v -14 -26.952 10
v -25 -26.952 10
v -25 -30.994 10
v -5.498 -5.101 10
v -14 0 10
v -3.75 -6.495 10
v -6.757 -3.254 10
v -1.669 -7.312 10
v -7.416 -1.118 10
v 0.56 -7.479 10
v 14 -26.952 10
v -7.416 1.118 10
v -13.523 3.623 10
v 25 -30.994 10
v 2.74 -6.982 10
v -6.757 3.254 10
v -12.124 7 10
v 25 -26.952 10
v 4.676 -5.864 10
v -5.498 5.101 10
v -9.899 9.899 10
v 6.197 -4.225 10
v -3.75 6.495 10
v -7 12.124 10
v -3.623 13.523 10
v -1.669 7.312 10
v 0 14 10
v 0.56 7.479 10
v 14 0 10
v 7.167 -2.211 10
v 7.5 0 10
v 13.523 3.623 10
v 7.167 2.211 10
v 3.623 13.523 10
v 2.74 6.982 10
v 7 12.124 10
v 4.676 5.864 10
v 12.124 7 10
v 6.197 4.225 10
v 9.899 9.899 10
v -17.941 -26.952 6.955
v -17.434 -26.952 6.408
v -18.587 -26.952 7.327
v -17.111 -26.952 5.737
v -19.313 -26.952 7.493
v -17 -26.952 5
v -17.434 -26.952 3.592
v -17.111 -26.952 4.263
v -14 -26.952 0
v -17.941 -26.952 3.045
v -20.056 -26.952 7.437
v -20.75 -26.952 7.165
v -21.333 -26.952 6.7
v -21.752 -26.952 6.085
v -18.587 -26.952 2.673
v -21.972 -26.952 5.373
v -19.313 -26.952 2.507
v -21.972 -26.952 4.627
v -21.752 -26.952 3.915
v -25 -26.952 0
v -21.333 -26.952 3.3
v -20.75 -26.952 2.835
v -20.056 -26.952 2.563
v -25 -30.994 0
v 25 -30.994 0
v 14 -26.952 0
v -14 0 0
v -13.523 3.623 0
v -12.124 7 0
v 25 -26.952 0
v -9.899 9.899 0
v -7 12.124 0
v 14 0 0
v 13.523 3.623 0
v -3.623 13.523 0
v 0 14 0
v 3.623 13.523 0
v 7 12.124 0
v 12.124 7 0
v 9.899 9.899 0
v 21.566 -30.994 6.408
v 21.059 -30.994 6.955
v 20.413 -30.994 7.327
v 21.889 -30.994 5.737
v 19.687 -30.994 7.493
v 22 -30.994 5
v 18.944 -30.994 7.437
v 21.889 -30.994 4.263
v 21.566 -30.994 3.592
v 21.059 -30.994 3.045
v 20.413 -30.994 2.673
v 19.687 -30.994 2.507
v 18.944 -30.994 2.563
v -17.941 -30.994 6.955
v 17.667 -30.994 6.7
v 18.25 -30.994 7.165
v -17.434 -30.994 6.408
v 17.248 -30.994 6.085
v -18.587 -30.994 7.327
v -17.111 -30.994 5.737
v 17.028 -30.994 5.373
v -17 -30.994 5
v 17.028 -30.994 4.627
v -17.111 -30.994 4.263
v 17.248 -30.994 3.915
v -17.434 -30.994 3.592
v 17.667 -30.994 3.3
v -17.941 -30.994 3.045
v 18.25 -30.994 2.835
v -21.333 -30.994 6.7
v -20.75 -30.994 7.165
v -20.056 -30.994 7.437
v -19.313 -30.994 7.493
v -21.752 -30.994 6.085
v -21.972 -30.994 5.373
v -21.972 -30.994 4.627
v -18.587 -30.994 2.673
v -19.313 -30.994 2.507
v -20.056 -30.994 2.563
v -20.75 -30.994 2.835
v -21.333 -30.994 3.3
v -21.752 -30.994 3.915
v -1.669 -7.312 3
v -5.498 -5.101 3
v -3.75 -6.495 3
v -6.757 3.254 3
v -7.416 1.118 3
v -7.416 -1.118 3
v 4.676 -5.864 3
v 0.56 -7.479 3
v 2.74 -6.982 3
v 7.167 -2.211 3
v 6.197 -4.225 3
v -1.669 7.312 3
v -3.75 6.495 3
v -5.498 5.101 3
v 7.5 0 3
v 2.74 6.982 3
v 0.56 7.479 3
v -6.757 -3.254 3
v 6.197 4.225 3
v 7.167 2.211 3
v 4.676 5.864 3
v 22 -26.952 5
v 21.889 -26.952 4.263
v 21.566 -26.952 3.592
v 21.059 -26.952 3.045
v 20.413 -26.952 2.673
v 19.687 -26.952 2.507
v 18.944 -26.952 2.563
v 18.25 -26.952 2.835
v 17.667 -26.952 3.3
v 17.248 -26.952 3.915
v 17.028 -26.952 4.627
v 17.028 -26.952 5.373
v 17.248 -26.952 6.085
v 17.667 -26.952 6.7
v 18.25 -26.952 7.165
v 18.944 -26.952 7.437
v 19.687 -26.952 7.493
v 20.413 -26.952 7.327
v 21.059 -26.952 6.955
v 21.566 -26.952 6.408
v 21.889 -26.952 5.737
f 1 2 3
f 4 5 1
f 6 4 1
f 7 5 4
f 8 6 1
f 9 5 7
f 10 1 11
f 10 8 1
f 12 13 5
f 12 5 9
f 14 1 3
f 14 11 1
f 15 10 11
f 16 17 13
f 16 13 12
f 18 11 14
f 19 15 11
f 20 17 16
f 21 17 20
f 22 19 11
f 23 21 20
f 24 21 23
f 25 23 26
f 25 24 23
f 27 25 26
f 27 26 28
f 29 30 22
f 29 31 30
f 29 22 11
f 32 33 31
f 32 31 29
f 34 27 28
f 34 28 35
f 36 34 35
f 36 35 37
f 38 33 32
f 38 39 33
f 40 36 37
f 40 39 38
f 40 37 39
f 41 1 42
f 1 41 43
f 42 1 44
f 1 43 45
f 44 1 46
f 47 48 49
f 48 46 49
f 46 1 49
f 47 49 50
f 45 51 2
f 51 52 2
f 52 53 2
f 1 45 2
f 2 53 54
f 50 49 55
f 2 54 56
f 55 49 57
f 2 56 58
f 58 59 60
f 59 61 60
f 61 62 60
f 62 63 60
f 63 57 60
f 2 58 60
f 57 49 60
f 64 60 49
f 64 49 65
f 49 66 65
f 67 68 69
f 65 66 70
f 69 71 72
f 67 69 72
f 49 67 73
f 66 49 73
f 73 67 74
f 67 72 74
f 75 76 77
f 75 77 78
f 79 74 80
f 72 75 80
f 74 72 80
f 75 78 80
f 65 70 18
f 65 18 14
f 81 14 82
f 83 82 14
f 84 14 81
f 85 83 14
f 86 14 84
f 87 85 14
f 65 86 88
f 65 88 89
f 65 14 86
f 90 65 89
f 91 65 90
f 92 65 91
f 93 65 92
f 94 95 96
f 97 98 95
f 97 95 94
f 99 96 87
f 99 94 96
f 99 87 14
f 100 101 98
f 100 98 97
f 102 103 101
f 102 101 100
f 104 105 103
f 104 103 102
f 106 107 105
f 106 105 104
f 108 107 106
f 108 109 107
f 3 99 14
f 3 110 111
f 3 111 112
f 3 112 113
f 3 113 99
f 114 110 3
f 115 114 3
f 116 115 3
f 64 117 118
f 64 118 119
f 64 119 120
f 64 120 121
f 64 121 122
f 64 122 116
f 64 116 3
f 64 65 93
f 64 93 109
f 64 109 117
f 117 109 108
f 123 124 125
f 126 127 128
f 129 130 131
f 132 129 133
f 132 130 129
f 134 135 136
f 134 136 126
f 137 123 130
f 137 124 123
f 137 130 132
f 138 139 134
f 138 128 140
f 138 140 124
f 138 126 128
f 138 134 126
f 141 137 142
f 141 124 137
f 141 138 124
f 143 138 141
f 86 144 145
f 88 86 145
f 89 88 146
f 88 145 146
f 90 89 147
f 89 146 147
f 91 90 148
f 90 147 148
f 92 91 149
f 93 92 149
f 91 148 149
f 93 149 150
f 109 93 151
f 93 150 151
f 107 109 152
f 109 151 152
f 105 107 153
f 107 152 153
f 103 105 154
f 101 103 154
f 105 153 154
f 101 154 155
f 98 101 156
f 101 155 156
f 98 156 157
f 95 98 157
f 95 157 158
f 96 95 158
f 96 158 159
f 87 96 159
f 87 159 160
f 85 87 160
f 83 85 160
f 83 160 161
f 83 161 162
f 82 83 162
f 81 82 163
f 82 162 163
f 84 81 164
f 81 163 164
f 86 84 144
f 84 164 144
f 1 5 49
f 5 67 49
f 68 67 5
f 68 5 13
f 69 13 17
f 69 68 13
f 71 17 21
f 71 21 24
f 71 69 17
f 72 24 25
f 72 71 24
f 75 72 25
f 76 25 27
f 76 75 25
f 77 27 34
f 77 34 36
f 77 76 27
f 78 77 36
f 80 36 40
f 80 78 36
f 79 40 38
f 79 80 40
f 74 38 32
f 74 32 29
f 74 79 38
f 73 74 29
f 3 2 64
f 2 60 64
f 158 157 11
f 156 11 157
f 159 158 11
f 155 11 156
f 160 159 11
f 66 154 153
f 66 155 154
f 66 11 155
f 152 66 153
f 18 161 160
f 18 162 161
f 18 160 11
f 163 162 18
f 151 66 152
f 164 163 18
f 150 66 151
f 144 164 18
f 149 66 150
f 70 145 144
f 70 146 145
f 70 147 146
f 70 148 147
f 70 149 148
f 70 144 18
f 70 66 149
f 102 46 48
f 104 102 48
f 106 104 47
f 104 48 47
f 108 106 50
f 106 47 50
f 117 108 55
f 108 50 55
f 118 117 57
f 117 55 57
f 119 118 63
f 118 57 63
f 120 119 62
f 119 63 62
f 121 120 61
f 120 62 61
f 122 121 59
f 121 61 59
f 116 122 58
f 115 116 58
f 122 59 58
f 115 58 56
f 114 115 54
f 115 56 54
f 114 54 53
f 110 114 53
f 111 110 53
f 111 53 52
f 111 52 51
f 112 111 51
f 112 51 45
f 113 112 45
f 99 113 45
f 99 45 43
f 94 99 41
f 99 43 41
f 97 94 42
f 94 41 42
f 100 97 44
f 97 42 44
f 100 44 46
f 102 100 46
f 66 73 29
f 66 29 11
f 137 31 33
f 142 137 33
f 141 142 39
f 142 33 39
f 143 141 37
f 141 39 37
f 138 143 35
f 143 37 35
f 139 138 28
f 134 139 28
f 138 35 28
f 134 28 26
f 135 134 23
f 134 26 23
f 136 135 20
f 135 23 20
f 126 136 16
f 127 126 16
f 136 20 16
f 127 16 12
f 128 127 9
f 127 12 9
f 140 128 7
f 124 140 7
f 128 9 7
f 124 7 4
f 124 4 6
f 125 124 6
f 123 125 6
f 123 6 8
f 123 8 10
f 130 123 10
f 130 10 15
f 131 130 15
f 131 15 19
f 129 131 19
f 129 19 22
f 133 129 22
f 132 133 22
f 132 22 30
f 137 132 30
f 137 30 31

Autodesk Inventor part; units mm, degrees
ref_plane "YZ Plane" through (0, 0, 0) normal (1, 0, 0) x (0, 1, 0)
ref_plane "XZ Plane" through (0, 0, 0) normal (0, 1, 0) x (-1, 0, 0)
ref_plane "XY Plane" through (0, 0, 0) normal (0, 0, 1) x (1, 0, 0)
sketch "Boceto1" plane through (0, 0, 0) normal (0, 0, 1) x (1, 0, 0)
  arc A0 (0, 14) -> (-14, 0) centre (0, 0) ccw
  line L0 (-14, 0) -> (-14, -26.9516)
  line L1 (-14, -26.9516) -> (-25, -26.9516)
  line L2 (-25, -26.9516) -> (-25, -30.9943)
  line L3 (-25, -30.9943) -> (0, -30.9943)
  line L4 (0, -30.9943) -> (0, 14) construction
  arc A1 (0, 7.5) -> (0, -7.5) centre (0, 0) ccw
  arc A2 (14, 0) -> (0, 14) centre (0, 0) ccw
  line L5 (14, 0) -> (14, -26.9516)
  line L6 (14, -26.9516) -> (25, -26.9516)
  line L7 (25, -26.9516) -> (25, -30.9943)
  line L8 (25, -30.9943) -> (0, -30.9943)
  arc A3 (0, -7.5) -> (0, 7.5) centre (0, 0) ccw
  dimension "d2" = 7.5
  dimension "d6" = 50
  dimension "d7" = 28
extrude "Extrusión1" add sketch "Boceto1" along normal blind 10 contours A2 L5 L6 L7 L8 L3 L2 L1 L0 A0 | A3 A1
sketch "Boceto2" plane through (-25, -26.9516, 0) normal (0, 1, 0) x (1, 0, 0)
  line L0 (11, 0) -> (39, 0) projected
  line L1 (0, -10) -> (50, -10) projected
  line L2 (11, 0) -> (0, -10)
  line L3 (11, -10) -> (39, -10) projected
  line L4 (0, 0) -> (50, 0) projected
  line L5 (11, -10) -> (0, 0)
  line L6 (0, 0) -> (50, -10)
  line L7 (0, -10) -> (50, 0)
  line L8 (25, -5) -> (25, 11.6359)
  circle A0 centre (5.5, -5) radius 2.5
  circle A1 centre (44.5, -5) radius 2.5
  point P0 (25, 0)
  dimension "d3" = 5
extrude "Extrusión2" cut sketch "Boceto2" against normal blind 5 contours A0 L5 L2 | L2 L5 A0 | L5 L2 A0 | L5 A0 L2 | A1
sketch "Boceto3" plane through (0, 0, 10) normal (0, 0, 1) x (1, 0, 0)
  circle A0 centre (0, 0) radius 7.5
  dimension "d8" = 15
extrude "Extrusión3" cut sketch "Boceto3" against normal blind 7
properties part number "sopoetellantas"
